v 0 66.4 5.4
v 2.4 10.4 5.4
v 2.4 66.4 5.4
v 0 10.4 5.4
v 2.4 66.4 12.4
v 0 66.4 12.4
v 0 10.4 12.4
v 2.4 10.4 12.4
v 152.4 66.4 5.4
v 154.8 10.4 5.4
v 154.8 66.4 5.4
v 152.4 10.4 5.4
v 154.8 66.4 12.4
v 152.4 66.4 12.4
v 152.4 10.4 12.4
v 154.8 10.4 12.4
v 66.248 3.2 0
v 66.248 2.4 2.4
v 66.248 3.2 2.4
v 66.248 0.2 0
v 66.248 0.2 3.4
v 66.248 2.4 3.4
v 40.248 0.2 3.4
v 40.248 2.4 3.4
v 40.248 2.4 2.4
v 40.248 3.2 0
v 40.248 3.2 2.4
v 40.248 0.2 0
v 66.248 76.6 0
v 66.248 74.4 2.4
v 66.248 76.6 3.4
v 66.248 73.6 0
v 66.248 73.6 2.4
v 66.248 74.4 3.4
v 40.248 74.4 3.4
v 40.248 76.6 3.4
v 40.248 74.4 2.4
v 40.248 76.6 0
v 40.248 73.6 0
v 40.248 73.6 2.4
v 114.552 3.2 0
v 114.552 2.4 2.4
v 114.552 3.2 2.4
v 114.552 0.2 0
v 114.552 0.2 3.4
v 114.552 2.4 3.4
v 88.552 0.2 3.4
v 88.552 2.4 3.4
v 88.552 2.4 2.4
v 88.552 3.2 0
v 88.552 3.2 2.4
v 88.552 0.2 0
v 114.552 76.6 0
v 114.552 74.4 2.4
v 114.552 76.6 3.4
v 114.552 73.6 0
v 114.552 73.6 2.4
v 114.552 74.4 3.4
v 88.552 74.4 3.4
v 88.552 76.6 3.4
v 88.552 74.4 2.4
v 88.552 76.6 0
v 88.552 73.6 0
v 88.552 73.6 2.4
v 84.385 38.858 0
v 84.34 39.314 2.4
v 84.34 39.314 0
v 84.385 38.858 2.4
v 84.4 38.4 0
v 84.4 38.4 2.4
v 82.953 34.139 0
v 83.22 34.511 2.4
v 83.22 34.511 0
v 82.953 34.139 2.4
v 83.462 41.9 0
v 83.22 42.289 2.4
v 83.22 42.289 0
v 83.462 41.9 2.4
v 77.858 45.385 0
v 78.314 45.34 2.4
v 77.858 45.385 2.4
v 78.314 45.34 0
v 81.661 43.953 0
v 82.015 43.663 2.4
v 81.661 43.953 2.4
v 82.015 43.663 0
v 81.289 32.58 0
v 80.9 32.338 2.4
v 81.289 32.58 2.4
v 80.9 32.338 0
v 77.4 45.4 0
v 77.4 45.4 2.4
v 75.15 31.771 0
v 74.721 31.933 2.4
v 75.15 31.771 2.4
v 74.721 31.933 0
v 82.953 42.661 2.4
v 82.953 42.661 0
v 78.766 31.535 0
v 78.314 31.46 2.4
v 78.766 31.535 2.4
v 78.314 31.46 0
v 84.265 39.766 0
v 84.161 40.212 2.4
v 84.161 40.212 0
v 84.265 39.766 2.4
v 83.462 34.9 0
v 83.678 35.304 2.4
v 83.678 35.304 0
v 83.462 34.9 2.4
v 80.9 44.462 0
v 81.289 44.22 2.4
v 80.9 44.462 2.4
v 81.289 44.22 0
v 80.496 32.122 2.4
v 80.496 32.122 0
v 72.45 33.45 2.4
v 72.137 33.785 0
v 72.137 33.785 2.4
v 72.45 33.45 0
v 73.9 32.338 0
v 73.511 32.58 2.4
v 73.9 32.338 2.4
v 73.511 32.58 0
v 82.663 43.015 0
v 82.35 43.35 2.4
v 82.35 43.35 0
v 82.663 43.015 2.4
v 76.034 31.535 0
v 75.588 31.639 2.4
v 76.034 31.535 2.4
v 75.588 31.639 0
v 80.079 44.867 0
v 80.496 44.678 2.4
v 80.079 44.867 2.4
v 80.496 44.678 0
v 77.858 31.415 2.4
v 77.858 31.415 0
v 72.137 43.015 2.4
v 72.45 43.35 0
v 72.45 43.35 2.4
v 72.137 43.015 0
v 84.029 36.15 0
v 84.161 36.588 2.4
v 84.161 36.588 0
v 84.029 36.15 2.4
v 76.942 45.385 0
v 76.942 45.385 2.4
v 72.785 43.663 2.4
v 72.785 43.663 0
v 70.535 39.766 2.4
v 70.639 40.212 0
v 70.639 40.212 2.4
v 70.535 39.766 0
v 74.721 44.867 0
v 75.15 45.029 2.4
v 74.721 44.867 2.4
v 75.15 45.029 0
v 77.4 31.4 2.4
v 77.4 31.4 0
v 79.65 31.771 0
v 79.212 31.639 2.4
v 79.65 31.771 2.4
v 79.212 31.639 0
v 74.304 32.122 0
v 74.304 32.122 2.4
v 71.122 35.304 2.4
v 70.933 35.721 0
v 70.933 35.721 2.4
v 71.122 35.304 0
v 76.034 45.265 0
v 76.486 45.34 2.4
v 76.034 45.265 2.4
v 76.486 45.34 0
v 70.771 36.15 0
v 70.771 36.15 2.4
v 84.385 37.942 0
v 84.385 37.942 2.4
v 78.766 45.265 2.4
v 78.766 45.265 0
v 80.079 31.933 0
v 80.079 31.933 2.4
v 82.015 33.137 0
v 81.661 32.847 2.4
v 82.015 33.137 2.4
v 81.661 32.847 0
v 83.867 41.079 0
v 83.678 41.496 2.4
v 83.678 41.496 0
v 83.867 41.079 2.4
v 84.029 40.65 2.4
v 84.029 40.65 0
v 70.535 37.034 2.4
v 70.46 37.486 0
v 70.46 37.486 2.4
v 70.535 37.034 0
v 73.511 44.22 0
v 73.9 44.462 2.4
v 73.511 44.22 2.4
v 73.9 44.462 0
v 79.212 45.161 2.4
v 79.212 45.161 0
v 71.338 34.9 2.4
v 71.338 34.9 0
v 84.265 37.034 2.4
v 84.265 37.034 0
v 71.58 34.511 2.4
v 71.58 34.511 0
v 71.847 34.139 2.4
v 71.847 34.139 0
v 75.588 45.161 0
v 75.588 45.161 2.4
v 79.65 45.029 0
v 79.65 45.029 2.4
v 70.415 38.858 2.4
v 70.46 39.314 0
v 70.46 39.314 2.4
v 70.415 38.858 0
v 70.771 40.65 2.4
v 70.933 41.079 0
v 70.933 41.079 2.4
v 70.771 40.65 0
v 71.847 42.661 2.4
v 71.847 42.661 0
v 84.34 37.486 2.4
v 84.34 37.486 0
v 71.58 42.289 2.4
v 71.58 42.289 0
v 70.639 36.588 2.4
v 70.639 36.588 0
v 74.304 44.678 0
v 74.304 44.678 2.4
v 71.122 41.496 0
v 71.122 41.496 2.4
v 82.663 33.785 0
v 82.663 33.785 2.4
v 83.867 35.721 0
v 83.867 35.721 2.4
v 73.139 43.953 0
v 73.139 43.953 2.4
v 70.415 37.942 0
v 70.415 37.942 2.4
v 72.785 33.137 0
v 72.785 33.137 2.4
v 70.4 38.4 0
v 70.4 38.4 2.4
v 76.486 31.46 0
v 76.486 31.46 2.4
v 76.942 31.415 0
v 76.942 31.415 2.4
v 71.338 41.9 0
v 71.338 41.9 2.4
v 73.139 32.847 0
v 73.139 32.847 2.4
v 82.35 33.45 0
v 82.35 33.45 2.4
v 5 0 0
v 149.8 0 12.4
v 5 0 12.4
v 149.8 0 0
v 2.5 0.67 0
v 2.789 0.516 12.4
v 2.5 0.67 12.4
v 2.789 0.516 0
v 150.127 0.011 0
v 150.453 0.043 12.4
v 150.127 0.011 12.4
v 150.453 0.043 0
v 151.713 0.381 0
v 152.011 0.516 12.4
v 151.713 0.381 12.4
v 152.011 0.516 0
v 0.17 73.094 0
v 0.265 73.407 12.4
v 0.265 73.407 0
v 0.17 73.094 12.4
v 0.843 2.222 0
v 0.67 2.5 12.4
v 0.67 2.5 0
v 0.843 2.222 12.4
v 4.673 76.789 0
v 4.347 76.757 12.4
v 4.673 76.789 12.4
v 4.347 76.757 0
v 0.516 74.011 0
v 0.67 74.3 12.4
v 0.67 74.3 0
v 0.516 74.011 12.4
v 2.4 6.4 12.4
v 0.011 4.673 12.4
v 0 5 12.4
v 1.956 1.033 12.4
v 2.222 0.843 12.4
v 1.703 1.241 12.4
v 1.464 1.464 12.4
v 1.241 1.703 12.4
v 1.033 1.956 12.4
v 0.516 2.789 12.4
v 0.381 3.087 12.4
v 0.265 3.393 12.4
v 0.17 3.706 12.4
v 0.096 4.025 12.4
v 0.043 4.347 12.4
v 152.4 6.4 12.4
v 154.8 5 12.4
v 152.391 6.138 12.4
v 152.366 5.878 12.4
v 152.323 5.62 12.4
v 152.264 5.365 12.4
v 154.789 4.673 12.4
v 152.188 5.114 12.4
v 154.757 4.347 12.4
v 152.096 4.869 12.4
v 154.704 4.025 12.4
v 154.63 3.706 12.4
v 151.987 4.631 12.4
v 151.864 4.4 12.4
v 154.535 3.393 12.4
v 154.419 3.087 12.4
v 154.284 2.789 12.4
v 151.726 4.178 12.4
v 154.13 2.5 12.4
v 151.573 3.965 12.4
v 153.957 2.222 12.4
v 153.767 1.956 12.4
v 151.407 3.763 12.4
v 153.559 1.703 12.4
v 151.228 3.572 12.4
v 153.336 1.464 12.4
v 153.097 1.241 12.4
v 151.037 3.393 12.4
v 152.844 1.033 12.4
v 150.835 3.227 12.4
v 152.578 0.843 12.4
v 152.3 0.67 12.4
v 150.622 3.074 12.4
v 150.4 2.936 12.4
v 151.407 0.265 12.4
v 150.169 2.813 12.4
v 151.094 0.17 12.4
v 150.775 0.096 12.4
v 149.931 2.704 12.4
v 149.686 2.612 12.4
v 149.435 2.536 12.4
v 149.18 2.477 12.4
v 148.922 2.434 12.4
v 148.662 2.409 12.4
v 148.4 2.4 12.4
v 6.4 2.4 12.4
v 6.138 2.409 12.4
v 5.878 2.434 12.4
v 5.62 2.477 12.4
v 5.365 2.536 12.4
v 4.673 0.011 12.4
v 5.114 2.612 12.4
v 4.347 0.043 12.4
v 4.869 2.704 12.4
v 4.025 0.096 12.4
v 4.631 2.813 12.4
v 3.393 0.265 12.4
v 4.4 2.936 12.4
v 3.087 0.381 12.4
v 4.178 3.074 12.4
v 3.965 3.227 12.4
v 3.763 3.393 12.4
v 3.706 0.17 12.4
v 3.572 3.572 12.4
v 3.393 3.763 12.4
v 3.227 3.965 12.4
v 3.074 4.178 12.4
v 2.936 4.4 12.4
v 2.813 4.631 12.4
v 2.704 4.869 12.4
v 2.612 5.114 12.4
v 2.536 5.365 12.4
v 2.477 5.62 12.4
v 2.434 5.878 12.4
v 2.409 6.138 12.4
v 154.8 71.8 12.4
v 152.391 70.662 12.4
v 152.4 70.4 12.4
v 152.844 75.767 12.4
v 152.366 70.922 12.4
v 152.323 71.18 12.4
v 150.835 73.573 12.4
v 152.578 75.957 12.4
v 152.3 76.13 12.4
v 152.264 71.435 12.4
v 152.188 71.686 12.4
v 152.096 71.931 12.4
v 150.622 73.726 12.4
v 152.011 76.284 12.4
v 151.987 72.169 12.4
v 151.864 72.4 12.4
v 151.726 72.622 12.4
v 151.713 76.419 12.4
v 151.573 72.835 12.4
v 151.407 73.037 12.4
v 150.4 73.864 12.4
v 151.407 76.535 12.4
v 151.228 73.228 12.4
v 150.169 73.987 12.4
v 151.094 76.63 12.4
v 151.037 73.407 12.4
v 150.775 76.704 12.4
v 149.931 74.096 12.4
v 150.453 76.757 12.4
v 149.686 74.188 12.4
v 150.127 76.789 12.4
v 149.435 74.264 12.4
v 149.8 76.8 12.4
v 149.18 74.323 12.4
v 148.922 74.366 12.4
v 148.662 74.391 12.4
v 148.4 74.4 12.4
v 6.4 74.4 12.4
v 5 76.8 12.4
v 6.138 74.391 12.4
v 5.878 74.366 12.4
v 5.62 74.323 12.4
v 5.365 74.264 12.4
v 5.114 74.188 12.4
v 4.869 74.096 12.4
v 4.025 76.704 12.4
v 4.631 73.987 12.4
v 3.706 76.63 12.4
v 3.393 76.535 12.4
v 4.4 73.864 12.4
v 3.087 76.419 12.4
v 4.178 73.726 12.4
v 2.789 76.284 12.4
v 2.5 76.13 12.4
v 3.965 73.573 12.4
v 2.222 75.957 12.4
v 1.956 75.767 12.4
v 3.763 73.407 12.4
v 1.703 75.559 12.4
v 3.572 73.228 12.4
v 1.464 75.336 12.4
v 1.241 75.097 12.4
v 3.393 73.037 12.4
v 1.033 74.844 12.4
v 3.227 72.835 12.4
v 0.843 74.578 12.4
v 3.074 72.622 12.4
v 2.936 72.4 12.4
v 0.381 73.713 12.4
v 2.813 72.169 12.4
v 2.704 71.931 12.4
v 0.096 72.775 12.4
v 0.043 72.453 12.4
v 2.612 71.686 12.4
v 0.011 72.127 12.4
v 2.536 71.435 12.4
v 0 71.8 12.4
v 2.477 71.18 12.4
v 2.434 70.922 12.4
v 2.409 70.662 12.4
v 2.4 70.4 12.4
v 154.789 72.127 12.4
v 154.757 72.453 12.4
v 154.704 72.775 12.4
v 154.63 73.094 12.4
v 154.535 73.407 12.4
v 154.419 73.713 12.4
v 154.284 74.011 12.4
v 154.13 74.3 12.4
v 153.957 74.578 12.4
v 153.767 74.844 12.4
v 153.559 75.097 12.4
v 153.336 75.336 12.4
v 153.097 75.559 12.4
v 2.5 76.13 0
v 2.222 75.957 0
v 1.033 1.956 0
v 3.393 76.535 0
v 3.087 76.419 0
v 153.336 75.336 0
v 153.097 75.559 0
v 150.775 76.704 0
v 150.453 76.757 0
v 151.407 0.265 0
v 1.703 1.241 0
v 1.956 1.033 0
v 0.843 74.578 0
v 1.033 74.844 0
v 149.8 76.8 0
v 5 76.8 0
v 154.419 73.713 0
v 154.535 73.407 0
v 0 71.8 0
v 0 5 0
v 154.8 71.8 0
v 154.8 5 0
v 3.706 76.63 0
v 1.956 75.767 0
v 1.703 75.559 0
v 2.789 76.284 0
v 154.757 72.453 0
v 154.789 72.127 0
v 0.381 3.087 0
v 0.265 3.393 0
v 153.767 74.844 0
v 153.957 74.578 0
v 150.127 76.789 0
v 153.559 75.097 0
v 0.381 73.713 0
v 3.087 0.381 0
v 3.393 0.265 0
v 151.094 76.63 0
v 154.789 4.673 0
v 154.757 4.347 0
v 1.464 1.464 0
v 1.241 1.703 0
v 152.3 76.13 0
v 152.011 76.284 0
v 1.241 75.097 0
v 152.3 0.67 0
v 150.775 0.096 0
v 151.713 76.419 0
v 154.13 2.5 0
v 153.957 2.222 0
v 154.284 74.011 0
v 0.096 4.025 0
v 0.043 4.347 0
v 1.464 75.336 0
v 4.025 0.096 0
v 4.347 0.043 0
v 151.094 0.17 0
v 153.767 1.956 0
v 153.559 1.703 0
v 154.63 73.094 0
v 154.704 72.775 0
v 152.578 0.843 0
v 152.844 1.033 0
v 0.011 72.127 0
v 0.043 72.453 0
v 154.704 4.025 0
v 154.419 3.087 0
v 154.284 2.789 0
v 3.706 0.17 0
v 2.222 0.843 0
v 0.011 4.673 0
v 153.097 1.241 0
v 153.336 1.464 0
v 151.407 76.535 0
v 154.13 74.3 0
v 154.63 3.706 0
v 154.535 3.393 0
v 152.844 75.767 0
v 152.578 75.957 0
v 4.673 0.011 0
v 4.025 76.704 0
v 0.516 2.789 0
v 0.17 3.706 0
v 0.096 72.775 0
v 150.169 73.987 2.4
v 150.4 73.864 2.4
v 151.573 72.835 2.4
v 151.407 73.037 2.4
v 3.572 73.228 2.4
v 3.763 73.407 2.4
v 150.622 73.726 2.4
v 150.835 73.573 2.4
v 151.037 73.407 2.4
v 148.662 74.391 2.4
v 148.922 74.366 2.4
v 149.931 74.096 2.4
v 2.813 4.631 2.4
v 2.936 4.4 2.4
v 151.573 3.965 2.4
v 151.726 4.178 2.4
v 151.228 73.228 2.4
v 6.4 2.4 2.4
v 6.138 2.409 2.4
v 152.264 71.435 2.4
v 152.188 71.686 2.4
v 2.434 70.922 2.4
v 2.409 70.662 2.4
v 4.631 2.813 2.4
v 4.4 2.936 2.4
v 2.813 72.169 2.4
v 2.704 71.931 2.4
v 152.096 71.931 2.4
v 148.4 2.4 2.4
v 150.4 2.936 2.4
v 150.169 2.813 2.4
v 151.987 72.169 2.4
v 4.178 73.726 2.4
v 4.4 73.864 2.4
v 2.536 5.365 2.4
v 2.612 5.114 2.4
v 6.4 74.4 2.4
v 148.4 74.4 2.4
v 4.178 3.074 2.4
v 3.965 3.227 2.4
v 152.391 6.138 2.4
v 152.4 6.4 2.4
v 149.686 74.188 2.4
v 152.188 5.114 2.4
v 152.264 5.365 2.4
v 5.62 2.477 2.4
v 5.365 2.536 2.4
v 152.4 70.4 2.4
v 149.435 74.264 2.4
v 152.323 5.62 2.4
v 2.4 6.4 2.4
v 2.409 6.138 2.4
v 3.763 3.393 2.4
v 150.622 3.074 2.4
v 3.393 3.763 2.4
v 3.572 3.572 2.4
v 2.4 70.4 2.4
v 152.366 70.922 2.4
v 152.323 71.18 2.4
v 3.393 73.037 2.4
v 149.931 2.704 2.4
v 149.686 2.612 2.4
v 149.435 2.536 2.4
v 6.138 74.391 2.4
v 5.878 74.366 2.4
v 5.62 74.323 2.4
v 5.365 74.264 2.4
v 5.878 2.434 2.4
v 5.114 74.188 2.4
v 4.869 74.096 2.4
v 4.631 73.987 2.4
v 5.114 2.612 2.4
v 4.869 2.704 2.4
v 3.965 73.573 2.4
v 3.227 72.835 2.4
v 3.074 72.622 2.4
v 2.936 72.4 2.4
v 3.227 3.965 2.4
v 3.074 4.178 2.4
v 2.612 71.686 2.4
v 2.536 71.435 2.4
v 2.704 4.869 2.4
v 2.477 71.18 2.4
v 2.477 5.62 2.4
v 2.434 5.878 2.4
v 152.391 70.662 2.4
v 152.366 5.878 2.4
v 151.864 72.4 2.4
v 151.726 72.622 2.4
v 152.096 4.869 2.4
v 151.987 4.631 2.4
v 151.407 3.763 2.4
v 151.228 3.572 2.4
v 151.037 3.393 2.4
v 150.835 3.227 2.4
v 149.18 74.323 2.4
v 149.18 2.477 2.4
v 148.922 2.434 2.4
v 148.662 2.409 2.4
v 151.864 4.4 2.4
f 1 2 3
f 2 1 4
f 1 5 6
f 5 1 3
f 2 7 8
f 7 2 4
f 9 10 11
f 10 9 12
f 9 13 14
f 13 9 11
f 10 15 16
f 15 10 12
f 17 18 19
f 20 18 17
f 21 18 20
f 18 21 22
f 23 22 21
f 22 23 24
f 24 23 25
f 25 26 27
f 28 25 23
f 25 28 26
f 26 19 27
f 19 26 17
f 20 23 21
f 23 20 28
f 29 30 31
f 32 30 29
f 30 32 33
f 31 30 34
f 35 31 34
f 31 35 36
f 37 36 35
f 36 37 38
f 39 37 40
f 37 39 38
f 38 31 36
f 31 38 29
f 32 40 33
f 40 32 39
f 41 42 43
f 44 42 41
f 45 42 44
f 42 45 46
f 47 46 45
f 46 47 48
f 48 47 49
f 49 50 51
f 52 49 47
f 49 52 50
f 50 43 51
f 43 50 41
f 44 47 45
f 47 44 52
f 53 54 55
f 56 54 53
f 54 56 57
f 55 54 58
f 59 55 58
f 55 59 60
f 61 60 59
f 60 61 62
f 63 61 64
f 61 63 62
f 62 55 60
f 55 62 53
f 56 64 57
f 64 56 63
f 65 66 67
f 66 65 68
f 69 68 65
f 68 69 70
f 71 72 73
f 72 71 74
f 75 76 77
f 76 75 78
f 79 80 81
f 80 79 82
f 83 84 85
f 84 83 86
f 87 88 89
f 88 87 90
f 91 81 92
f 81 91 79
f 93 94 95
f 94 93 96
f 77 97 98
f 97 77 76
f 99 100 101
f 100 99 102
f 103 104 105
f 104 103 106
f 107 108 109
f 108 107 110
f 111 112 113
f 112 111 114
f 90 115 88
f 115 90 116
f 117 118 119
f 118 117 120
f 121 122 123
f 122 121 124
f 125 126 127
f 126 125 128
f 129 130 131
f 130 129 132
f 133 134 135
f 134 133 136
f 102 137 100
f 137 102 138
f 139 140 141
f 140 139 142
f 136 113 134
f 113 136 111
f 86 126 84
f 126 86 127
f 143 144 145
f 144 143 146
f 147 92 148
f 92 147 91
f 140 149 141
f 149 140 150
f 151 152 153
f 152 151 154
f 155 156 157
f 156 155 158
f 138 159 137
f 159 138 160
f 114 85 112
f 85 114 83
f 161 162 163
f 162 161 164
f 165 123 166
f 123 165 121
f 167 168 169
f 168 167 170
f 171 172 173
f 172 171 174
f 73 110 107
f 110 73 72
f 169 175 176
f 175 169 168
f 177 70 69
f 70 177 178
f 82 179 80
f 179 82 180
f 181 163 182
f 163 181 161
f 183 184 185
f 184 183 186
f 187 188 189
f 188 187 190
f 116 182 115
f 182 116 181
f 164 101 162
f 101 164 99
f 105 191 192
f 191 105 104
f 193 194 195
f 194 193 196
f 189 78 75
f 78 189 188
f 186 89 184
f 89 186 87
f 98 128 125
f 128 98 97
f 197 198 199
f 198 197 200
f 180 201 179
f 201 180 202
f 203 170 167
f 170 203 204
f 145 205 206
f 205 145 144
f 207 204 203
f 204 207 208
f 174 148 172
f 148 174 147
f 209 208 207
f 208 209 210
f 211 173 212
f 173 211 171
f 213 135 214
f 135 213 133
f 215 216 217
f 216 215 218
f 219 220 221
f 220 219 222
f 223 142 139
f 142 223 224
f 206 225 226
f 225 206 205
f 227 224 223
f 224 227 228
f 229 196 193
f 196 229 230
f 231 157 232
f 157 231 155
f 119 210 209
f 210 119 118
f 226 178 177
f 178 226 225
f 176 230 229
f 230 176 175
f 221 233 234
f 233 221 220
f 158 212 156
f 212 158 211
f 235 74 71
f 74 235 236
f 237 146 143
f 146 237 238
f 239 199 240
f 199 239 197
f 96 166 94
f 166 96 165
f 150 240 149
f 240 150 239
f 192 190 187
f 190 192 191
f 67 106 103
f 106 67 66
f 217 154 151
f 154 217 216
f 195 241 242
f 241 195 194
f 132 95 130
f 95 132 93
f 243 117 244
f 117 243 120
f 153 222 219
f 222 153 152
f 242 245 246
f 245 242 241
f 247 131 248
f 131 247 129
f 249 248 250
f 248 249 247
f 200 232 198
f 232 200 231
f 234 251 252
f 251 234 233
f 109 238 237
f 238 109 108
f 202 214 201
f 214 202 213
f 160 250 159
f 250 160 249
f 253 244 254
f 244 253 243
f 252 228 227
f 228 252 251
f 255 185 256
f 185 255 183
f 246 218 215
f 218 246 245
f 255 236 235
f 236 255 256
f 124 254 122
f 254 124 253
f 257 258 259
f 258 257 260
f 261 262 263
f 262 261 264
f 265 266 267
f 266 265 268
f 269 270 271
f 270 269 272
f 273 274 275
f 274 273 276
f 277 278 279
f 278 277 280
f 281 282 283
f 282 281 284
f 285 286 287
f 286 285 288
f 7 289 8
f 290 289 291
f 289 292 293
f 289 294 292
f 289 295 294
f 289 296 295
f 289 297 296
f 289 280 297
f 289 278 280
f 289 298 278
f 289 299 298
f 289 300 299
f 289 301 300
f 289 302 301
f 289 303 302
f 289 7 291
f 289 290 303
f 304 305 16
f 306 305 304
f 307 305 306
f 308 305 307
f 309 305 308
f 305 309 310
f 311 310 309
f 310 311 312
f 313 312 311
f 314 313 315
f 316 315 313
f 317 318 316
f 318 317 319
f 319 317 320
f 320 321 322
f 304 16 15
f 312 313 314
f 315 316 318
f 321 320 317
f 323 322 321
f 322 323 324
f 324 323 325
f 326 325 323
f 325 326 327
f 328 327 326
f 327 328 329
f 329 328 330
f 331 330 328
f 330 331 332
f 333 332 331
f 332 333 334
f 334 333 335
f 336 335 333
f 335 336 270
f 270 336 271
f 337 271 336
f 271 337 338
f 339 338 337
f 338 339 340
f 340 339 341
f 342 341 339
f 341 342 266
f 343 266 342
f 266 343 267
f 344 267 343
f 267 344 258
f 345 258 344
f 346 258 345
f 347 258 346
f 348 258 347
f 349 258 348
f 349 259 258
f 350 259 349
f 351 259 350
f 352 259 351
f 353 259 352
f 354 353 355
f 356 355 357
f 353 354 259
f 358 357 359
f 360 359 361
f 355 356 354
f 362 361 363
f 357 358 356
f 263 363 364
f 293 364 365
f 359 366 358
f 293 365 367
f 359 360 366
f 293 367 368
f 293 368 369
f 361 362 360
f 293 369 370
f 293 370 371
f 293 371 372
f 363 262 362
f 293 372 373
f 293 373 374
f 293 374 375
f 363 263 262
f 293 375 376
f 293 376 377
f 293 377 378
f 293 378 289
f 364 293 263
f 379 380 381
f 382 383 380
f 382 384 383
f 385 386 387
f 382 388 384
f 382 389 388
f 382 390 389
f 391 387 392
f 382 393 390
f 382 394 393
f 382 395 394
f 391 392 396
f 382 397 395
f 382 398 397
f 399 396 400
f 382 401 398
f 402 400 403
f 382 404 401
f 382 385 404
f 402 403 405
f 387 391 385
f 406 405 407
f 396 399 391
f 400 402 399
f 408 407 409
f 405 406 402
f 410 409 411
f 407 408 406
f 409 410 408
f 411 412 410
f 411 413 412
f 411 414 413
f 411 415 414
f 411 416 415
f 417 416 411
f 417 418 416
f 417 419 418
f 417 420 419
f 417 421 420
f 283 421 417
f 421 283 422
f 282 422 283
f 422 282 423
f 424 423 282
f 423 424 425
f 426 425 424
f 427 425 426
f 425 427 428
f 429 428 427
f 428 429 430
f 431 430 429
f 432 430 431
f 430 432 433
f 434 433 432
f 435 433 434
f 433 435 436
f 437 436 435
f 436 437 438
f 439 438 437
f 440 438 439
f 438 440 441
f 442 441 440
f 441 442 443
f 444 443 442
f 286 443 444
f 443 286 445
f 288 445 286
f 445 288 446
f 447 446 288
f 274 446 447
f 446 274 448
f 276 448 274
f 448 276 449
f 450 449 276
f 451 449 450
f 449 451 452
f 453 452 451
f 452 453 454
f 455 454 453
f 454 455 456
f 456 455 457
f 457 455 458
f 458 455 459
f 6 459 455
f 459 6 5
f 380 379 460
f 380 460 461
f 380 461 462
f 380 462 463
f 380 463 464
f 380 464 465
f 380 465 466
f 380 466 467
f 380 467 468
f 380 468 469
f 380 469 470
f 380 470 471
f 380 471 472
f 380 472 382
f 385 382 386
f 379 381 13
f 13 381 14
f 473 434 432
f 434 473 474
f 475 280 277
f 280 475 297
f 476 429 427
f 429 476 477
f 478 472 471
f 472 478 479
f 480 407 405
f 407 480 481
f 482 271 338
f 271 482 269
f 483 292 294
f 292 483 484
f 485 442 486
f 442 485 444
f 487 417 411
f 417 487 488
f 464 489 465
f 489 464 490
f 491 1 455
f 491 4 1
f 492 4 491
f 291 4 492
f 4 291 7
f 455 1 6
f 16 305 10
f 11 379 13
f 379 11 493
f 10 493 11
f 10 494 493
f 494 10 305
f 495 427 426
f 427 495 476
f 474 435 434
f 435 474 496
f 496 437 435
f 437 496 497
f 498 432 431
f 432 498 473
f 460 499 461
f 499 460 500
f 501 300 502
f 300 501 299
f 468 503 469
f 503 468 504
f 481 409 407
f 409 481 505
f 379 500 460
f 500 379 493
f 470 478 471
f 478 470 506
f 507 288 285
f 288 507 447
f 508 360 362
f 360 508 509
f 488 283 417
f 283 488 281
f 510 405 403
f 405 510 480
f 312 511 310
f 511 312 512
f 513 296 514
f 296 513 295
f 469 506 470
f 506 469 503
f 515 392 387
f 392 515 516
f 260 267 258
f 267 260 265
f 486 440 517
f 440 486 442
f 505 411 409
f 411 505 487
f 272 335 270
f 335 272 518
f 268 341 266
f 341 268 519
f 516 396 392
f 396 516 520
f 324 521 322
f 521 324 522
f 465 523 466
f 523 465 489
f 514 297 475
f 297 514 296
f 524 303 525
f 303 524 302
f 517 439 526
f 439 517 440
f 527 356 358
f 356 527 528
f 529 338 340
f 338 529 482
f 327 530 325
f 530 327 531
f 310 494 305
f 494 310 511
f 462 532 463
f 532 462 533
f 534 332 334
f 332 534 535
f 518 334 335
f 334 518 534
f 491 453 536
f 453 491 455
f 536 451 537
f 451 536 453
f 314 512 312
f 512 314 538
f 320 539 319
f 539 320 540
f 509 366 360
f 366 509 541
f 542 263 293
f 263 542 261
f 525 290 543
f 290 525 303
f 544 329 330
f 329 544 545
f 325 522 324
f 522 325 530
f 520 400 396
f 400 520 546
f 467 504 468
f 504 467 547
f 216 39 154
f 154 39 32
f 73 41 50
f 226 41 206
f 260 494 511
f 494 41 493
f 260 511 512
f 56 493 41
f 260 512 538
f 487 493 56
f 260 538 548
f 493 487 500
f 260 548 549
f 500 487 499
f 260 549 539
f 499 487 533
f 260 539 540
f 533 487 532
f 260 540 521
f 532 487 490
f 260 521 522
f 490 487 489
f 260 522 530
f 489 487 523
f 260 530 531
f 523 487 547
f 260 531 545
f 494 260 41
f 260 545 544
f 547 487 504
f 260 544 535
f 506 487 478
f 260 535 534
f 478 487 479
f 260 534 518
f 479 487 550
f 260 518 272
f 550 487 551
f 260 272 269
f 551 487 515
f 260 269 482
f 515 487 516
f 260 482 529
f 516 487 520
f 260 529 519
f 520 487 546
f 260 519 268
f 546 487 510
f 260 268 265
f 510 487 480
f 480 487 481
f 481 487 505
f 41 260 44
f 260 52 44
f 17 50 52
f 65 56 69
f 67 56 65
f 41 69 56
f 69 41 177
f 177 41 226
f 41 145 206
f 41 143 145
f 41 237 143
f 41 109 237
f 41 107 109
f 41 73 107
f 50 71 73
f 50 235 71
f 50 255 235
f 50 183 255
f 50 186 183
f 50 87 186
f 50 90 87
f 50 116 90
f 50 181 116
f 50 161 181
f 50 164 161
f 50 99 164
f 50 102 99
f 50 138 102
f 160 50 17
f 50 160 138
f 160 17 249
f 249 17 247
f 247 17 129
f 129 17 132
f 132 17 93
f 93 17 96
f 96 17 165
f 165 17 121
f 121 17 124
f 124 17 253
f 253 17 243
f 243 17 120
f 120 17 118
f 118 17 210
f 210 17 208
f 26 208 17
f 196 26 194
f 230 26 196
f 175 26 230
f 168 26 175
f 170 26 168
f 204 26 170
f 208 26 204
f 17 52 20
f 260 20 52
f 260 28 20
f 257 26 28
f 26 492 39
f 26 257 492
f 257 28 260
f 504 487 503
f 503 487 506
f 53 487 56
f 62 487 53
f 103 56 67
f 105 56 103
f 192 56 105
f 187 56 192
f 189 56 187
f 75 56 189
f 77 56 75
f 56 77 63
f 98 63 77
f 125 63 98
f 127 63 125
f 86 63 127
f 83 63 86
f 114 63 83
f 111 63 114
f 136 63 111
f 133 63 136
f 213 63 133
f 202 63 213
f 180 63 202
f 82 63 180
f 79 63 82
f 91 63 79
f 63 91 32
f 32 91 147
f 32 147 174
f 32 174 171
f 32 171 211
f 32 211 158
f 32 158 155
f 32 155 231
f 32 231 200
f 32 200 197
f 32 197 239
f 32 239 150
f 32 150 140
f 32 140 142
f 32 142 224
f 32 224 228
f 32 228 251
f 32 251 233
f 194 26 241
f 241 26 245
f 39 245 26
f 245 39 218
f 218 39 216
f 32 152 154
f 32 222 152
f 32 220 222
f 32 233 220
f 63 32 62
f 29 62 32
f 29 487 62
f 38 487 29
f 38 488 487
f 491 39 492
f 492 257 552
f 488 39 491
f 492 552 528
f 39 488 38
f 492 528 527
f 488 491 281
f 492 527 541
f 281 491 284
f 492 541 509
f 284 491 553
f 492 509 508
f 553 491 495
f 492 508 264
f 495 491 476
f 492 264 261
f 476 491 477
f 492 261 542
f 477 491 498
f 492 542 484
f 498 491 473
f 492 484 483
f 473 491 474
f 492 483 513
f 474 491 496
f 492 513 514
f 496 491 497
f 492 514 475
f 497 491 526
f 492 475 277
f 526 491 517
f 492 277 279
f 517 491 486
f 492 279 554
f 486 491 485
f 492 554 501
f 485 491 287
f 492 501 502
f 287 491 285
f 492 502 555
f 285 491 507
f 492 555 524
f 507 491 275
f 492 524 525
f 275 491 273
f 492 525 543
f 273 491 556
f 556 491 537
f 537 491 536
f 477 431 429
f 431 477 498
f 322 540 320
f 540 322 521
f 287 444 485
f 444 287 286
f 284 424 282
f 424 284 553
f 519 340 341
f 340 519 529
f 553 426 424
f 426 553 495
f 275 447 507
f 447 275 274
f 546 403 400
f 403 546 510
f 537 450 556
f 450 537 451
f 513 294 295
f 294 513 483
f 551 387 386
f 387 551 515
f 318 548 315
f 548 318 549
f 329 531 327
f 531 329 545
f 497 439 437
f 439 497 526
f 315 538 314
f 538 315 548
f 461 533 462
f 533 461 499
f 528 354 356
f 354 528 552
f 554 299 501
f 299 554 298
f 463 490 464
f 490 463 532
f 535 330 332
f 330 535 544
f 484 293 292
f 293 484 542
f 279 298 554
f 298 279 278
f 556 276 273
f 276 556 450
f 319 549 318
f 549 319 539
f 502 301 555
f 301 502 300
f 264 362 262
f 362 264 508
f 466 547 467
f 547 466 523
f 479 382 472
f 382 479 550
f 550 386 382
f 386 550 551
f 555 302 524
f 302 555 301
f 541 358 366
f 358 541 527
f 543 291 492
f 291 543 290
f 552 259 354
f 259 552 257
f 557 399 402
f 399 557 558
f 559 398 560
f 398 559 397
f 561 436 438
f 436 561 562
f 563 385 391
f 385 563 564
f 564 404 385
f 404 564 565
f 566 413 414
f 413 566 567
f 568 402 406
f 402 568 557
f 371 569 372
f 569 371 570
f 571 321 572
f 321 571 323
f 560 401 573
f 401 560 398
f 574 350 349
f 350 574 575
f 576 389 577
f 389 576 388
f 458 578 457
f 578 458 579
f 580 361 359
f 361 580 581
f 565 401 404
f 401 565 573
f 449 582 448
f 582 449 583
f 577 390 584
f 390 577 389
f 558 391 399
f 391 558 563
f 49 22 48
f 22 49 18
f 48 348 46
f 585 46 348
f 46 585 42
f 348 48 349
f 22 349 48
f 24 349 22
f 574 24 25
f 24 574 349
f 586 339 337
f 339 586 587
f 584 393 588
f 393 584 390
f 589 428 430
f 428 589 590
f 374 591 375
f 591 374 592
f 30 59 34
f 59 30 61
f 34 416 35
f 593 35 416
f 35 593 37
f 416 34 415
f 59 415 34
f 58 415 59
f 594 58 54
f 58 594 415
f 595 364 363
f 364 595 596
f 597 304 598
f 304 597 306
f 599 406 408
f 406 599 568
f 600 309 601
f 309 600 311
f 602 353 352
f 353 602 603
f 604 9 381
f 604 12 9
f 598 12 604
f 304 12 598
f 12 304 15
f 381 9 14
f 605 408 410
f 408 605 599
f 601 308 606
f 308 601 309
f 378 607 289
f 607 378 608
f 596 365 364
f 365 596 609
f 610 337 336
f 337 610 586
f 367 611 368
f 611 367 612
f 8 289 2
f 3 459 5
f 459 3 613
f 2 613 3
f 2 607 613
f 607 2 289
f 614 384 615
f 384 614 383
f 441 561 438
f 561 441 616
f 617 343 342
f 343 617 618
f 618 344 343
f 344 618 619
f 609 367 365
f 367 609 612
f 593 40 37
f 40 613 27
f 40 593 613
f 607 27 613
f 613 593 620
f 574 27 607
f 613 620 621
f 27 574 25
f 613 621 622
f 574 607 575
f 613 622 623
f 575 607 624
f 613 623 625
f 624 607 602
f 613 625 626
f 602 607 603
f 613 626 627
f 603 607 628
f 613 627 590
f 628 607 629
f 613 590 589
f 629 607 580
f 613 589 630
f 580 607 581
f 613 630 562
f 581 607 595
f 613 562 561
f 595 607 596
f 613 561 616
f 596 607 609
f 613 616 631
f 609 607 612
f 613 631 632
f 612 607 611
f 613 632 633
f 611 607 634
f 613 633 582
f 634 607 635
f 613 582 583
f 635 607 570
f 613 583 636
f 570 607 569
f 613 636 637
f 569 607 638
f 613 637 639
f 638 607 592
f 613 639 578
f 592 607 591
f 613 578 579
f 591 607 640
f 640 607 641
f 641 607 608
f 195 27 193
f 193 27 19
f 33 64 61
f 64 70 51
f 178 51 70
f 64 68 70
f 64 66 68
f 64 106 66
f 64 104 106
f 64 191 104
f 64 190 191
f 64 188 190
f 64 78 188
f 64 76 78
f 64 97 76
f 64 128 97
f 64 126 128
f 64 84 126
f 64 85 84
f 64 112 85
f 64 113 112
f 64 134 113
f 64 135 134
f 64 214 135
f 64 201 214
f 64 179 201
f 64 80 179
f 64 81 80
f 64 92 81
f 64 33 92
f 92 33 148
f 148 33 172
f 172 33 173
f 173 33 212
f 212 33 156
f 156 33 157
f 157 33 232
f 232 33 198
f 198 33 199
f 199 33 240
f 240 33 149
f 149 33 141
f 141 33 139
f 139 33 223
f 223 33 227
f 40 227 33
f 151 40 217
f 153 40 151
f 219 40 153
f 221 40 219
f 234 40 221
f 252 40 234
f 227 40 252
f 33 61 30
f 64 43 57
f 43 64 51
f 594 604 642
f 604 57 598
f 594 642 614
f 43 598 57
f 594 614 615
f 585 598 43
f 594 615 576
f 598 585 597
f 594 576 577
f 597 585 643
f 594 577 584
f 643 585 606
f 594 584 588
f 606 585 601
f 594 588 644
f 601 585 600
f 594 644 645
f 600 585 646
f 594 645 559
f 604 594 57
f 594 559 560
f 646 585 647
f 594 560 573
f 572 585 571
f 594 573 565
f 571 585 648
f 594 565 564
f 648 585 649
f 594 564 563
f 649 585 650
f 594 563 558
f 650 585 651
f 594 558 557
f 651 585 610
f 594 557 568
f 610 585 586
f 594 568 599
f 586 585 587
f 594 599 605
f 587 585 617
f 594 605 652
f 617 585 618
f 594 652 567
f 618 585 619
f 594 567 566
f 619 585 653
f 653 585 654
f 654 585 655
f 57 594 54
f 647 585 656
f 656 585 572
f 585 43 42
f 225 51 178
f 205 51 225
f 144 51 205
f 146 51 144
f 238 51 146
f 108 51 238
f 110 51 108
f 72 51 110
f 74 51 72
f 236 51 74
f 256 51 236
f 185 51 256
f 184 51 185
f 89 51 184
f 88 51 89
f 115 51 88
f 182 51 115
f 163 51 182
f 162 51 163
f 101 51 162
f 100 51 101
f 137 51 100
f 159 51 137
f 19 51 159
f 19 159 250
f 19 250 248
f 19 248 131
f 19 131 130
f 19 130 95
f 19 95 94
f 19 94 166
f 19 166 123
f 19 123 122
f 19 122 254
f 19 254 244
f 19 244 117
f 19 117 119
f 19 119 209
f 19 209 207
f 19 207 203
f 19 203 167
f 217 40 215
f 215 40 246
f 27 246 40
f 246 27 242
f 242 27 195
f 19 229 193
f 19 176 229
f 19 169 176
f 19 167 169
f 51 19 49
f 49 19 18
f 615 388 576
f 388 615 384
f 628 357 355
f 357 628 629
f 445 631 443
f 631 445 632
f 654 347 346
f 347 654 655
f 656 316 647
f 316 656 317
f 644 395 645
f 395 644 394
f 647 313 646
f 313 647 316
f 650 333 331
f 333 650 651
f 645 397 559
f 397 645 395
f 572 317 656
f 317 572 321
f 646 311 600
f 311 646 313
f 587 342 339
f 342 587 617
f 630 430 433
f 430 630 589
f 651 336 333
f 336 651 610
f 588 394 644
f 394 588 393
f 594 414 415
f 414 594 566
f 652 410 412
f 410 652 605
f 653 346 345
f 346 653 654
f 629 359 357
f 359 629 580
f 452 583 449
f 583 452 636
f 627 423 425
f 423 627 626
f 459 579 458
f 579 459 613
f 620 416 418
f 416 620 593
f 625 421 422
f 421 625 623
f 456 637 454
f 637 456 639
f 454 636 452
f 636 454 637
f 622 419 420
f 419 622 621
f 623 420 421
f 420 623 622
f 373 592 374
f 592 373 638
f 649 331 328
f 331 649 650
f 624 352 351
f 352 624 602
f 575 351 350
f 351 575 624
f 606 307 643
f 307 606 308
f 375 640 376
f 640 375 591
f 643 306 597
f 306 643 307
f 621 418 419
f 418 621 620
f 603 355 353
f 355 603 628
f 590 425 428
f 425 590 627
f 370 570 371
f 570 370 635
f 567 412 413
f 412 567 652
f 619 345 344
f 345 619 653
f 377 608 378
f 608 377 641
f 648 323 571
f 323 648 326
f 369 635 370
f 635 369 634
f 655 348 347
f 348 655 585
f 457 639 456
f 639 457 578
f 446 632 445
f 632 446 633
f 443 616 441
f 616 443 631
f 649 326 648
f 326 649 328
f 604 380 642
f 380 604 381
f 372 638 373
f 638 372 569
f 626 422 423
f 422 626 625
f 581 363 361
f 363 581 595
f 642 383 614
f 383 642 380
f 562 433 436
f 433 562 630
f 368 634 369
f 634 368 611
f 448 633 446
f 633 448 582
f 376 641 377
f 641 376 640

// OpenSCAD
// file: config.scad
// SportCam — shared parametric dimensions (mm).
// Every part file includes this; tweak here, re-render, everything stays consistent.
//
// This is the **PTZ-base build**: the camera, pan and tilt all come from the
// Arducam IMX477 PTZ camera with metal pan-tilt base (B0167B12), which bolts
// to the lid of a static enclosure. There is no pan stage, slip ring or
// tilt tower to print — see docs/02-hardware-mechanical.md.
//
// This is the **camera-only variant**: no UWB anchors, no mast, no wearable.
// The camera finds and follows a person by vision alone.

$fn = 96;
clr = 0.25;                    // general printed-fit clearance per side

// ---- enclosure -------------------------------------------------------------
// Holds the Pi 5 (85 × 56) flat on standoffs, the 5 V distribution and the
// LED ring. The lid carries the Arducam pan-tilt base.
base_d        = 135;           // outer diameter — the Pi plus the power boards
                               // need this much floor; see base_housing.scad
base_h        = 66;            // floor to lid underside
base_wall     = 3;
lid_t         = 5;             // lid is structural: it carries the whole camera
led_window_h  = 12;            // circumferential LED slot
led_window_z  = 20;

jack_d        = 8.2;           // 5 V barrel jack, panel mount
// Tripod socket: a 3/8-16 brass insert, which takes a 3/8-16 tripod screw
// directly and a 1/4-20 one through a removable 3/8→1/4 reducer bushing —
// so it fits every photo and video tripod. The boss is 8 mm tall because
// the Pi sits 6 mm above the floor over it: use an insert no longer than
// that (or file one down).
tripod_boss_d = 24;
tripod_boss_h = 8;
tripod_hole_d = 12.7;          // MEASURE YOUR INSERT: epoxied, so a snug slip fit

pi_l = 85; pi_w = 56;          // Raspberry Pi 5
pi_hole_dx = 58; pi_hole_dy = 49;
pi_standoff_h = 6;
pi_x_off      = -10;           // Pi sits off-centre, leaving the +X side for power

// ---- Arducam pan-tilt base interface ---------------------------------------
// MEASURE YOURS. Arducam publishes no drawing for the B0167B12 metal base and
// the footprint has changed between revisions, so the lid is cut with **slots**
// spanning the range below rather than fixed holes. If your base's bolt
// spacing falls outside it, edit these two numbers and re-render.
ptz_bolt_min  = 30;            // narrowest bolt spacing the slots accept
ptz_bolt_max  = 72;            // widest
ptz_slot_w    = 3.4;           // M3 clearance
ptz_cable_d   = 34;            // central opening: CSI ribbon + servo leads drop through

// ---- battery tray ----------------------------------------------------------
// Sized to a 25 000 mAh USB-C PD power bank. MEASURE YOURS — banks of the
// same capacity vary by 15 mm in every direction. The tray straps to a tripod
// leg or centre column, or sandwiches under the enclosure on a long 1/4-20
// (into the reducer bushing).
bank_l = 150; bank_w = 72; bank_h = 30;
tray_wall = 2.4;
tray_lip = 10;                 // how far the side walls come up the bank
tray_strap_w = 26;             // hook-and-loop strap slots
// main file
// Battery tray — carries the USB-C power bank low on the tripod.
//
// Two ways to mount it, both cut into the same part:
//   * strap it to a tripod leg or centre column through the two slots, or
//   * sandwich it between the tripod plate and the enclosure using a long
//     1/4-20 through the central bore, into the enclosure's reducer bushing.
//
// Keeping the heaviest single item at the bottom is what stops the rig being
// tippy once the camera head is on top.
include <config.scad>

ol = bank_l + 2 * tray_wall;
ow = bank_w + 2 * tray_wall;

module rbox(l, w, h, rad) {
    hull() for (x = [rad, l - rad], y = [rad, w - rad])
        translate([x, y, 0]) cylinder(r = rad, h = h);
}

module battery_tray() {
    difference() {
        rbox(ol, ow, tray_wall + tray_lip, 5);
        // bank pocket
        translate([tray_wall, tray_wall, tray_wall])
            rbox(bank_l, bank_w, tray_lip + 1, 4);
        // open the ends so a USB cable can leave either side
        for (x = [-1, ol - tray_wall - 1])
            translate([x, tray_wall + 8, tray_wall + 3])
                cube([tray_wall + 2, bank_w - 16, tray_lip]);
        // strap slots through the floor, either side of the pocket
        for (x = [ol * 0.26, ol * 0.74 - tray_strap_w])
            for (y = [tray_wall / 2 - 1, ow - tray_wall / 2 - 2])
                translate([x, y, -1]) cube([tray_strap_w, 3, tray_wall + 2]);
        // central 1/4-20 bore + counterbore for the bolt head
        translate([ol / 2, ow / 2, -1]) {
            cylinder(d = 7, h = tray_wall + 2);
            cylinder(d = 14, h = 4);
        }
    }
}

battery_tray();
